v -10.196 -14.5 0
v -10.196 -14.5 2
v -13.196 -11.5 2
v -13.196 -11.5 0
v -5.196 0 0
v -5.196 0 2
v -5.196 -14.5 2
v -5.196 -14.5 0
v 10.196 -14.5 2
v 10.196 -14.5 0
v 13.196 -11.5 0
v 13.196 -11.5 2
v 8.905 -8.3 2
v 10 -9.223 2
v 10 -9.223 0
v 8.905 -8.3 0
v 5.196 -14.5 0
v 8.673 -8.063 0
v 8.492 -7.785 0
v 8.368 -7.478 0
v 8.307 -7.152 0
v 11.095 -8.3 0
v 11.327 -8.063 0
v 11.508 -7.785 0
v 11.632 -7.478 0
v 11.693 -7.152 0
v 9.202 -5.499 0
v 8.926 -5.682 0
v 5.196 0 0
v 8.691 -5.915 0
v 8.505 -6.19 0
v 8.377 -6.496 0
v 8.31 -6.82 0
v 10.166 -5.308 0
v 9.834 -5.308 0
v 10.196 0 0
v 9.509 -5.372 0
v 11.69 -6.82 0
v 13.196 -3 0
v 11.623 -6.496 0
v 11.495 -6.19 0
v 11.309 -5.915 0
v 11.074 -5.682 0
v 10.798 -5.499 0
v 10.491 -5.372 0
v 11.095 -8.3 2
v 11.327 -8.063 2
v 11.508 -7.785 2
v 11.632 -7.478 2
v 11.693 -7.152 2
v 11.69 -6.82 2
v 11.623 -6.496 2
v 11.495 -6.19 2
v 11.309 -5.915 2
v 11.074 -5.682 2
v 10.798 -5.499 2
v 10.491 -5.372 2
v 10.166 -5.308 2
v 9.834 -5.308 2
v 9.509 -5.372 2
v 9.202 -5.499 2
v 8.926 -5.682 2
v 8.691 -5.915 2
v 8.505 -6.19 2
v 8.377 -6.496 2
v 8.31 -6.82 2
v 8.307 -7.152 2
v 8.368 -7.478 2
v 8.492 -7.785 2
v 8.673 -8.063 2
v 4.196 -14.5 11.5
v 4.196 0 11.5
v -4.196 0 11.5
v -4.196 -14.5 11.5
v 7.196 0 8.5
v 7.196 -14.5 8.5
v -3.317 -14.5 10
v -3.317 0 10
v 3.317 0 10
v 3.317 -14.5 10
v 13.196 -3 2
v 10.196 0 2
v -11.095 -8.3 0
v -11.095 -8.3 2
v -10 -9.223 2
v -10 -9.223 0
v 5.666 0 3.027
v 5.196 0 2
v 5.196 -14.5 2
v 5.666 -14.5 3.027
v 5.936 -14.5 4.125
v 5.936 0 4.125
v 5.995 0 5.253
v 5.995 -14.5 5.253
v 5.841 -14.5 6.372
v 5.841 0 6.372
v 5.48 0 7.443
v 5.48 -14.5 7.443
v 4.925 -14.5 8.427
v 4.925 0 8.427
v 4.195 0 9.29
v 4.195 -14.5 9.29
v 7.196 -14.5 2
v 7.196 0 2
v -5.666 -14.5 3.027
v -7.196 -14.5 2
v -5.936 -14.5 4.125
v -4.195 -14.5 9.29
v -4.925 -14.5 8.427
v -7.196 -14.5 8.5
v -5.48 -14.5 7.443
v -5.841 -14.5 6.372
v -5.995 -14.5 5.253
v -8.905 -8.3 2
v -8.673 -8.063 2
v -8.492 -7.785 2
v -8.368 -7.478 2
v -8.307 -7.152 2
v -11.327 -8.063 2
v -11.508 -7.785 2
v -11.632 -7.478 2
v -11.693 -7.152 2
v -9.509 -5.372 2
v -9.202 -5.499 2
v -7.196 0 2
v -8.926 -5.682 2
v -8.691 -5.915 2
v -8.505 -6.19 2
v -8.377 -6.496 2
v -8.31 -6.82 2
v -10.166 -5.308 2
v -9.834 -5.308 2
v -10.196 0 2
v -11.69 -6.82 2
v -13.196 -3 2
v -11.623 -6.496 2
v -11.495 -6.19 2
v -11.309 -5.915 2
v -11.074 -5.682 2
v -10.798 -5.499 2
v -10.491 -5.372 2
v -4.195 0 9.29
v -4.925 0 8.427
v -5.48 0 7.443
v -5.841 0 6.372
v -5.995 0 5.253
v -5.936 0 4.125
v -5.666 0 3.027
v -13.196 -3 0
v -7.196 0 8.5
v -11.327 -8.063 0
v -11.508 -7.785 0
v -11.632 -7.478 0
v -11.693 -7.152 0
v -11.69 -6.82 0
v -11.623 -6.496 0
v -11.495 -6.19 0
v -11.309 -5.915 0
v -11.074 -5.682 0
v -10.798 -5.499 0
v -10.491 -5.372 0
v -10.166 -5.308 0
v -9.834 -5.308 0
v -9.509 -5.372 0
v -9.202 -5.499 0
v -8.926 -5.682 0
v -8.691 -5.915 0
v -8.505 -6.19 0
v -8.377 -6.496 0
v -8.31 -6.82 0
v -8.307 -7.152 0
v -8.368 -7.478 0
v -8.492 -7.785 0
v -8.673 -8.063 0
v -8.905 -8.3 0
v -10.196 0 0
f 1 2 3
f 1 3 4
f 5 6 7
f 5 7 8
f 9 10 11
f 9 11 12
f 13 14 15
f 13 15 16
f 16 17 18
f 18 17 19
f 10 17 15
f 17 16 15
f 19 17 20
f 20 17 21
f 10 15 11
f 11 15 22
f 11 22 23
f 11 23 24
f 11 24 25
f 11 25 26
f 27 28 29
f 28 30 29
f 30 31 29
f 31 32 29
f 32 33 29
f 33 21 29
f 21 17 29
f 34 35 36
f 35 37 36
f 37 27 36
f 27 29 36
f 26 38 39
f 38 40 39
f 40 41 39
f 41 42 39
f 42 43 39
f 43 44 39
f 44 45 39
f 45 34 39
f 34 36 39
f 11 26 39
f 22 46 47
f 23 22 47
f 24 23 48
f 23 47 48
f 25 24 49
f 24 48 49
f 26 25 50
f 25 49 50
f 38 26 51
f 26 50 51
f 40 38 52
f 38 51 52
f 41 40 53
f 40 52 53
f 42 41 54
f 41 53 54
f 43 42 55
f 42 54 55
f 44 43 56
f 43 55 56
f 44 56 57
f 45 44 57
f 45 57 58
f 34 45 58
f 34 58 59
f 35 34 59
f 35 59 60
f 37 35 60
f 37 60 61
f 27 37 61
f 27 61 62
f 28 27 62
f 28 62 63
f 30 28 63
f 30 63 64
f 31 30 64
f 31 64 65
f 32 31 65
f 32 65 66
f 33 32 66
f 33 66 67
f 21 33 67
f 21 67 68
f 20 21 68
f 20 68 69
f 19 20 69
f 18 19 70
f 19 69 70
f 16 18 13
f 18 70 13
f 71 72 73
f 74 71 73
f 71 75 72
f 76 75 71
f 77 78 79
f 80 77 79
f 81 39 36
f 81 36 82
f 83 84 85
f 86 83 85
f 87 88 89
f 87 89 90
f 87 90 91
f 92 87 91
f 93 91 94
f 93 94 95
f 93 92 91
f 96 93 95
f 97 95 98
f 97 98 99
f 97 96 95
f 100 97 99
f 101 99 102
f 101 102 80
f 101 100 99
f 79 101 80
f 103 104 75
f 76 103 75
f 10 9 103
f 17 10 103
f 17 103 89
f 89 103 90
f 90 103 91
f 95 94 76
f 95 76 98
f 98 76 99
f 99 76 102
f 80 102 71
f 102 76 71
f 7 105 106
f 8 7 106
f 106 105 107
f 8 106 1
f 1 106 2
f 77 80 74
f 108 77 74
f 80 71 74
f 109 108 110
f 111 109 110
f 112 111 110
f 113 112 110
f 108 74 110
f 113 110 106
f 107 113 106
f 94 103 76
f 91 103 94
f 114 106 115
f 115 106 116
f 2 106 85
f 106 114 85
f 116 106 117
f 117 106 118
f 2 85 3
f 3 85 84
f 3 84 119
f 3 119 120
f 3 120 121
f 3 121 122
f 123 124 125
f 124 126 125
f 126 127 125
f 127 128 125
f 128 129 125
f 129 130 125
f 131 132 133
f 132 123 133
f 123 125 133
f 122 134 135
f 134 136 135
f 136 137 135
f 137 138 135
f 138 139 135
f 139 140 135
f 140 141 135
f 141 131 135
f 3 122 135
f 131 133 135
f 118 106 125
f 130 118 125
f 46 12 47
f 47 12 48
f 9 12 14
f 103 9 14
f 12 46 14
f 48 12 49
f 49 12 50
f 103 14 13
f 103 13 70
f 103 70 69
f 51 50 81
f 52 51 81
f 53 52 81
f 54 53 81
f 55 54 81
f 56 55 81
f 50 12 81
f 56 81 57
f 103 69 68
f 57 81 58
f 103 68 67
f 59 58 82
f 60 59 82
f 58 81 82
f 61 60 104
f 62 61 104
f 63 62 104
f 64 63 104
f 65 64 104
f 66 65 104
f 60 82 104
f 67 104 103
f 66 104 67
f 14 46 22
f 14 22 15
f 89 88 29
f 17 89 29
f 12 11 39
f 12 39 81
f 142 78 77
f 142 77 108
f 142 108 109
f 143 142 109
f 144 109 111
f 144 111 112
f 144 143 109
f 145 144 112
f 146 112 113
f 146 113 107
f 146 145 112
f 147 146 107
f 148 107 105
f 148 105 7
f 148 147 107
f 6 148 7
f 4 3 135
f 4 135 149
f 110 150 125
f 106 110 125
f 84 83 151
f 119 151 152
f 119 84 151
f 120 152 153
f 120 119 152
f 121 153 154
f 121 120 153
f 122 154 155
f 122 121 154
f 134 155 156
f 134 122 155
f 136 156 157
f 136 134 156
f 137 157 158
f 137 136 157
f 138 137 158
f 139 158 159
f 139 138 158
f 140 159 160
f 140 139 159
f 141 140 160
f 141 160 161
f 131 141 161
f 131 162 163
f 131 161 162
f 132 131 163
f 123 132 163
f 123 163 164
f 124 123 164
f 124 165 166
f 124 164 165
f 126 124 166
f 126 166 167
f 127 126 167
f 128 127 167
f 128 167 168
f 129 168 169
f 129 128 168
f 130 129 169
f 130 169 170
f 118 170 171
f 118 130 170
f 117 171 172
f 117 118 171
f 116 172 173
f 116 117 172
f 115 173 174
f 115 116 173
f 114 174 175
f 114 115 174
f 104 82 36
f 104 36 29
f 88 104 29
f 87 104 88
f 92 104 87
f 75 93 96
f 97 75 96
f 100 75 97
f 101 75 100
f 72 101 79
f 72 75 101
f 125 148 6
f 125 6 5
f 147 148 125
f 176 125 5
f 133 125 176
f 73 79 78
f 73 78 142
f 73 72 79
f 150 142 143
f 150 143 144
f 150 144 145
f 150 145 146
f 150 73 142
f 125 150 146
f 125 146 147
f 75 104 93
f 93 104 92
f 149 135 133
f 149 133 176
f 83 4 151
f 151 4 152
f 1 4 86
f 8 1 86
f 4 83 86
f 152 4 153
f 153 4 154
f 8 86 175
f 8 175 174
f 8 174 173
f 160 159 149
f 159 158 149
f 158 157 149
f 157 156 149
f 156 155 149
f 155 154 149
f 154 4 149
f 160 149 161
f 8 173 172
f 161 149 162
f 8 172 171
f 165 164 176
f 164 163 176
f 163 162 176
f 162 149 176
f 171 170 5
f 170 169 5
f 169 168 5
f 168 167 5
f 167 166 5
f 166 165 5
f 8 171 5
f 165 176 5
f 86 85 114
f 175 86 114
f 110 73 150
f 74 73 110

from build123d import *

# Parameters (mm, degrees)
PAD_DEPTH       = 14.5
POCKET_DEPTH    = 5
CHAMFER_SIZE    = 3
CHAMFER001_SIZE = 3


with BuildPart() as part:
    # Sketch → Pad (new body)
    with BuildSketch(Plane.XZ):
        with BuildLine():
            ThreePointArc((-3.316625, 10), (-5.840963, 6.372281), (-5.196152, 2))
            Line((-5.196152, 2), (-5.196152, 0))
            Line((-13.196152, 0), (-5.196152, 0))
            Line((-13.196152, 2), (-13.196152, 0))
            Line((-7.196152, 2), (-13.196152, 2))
            Line((-7.196152, 11.5), (-7.196152, 2))
            Line((7.196152, 11.5), (-7.196152, 11.5))
            Line((7.196152, 2), (7.196152, 11.5))
            Line((13.196152, 2), (7.196152, 2))
            Line((13.196152, 0), (13.196152, 2))
            Line((5.196152, 0), (13.196152, 0))
            Line((5.196152, 2), (5.196152, 0))
            ThreePointArc((5.196152, 2), (5.840963, 6.372281), (3.316625, 10))
            Line((-3.316625, 10), (3.316625, 10))
        make_face()
    extrude(amount=PAD_DEPTH)

    # Sketch001 (on Face7 of Pad) → Pocket (cut)
    with BuildSketch(Plane(origin=(0, 0, 2), x_dir=(-1, 0, 0), z_dir=(0, 0, 1))):
        with BuildLine():
            ThreePointArc((-11.095237, 8.300175), (-10, 5.3), (-8.904763, 8.300175))
            Line((-10, 9.222777), (-8.904763, 8.300175))
            Line((-11.095237, 8.300175), (-10, 9.222777))
        make_face()
    pocket = extrude(amount=-POCKET_DEPTH, mode=Mode.SUBTRACT)

    # Mirrored: Pocket across YZ
    add(pocket.mirror(Plane.YZ), mode=Mode.SUBTRACT)

    # Chamfer
    chamfer_edges = [part.edges().sort_by_distance(p)[0] for p in [
        (-7.196152, -7.25, 11.5),
        (7.196152, -7.25, 11.5),
    ]]
    chamfer(chamfer_edges, length=CHAMFER_SIZE)

    # Chamfer001
    chamfer001_edges = [part.edges().sort_by_distance(p)[0] for p in [
        (-13.196152, -14.5, 1),
        (13.196152, -14.5, 1),
        (13.196152, 0, 1),
        (-13.196152, 0, 1),
    ]]
    chamfer(chamfer001_edges, length=CHAMFER001_SIZE)


solid = part.part
